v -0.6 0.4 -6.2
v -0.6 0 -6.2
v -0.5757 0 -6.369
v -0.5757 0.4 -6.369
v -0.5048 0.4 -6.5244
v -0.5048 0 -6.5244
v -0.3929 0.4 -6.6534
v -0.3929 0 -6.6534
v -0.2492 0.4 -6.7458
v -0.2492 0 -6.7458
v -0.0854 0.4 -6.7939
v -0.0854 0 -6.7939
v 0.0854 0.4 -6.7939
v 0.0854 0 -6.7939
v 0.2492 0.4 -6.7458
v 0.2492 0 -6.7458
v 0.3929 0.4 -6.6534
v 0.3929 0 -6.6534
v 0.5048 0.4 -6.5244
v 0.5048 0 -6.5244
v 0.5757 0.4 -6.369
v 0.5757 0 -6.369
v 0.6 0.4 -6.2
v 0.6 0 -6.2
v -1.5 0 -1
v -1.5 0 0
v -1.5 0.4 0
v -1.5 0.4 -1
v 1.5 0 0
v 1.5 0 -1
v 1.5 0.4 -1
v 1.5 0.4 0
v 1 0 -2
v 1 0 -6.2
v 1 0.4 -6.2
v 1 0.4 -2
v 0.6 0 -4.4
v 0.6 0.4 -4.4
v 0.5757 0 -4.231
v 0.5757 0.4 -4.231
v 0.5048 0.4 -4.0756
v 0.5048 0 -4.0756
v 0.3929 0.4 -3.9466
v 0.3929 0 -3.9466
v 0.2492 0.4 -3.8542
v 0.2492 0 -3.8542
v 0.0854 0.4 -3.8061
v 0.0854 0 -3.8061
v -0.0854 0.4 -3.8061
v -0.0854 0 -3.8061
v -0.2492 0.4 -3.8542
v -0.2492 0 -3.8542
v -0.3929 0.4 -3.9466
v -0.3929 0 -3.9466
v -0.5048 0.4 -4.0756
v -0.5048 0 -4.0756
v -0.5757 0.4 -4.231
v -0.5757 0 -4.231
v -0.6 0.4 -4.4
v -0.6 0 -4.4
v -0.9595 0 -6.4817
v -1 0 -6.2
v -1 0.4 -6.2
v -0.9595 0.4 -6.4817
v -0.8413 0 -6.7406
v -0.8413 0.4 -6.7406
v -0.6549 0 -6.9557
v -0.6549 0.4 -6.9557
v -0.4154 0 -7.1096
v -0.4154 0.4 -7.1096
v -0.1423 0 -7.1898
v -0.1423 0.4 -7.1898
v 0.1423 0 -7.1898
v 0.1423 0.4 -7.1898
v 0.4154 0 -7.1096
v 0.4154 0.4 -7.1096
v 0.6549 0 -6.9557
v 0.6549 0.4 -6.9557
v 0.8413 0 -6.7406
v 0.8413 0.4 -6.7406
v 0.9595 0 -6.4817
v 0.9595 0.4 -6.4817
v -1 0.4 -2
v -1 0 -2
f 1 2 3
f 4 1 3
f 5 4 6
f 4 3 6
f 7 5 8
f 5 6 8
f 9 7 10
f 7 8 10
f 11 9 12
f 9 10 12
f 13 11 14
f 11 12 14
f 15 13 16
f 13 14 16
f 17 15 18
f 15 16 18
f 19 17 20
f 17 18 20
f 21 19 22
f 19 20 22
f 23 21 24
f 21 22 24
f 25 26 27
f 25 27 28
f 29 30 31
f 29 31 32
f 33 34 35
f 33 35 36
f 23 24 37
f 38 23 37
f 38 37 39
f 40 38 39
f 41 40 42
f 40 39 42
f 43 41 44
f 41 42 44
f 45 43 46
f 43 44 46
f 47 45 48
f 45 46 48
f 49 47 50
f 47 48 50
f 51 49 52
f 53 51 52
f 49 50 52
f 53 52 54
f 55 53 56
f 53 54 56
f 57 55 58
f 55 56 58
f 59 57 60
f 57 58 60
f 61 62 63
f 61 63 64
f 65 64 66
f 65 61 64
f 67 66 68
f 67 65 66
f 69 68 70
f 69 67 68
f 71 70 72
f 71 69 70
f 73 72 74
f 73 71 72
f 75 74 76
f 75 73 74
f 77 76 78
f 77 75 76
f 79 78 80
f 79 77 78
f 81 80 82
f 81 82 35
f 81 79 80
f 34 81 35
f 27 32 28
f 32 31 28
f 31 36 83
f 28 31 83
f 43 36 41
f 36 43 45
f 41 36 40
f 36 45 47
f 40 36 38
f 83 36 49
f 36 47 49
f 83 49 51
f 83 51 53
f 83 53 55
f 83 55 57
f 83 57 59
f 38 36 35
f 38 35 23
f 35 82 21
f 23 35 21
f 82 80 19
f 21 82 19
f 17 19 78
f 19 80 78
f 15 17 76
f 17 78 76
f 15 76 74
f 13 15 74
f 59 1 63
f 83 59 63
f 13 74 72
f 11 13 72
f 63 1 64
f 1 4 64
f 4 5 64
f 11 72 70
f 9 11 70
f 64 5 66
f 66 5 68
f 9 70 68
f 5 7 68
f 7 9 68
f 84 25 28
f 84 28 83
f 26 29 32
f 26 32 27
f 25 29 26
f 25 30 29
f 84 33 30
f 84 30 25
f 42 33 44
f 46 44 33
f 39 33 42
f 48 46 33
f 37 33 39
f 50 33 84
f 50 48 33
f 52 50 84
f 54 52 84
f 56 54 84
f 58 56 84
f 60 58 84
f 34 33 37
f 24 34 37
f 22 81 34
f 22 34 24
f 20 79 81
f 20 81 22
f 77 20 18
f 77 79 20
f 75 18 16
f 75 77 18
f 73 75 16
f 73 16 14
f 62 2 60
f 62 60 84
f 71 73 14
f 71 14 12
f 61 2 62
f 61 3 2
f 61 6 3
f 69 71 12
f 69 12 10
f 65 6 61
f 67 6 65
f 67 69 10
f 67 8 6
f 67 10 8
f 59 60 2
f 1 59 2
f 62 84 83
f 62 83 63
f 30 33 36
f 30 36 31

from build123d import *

# Parameters (mm, degrees)
BOSS_EXTRUDE1_DEPTH = 0.4


with BuildPart() as part:
    # Sketch1 → Boss-Extrude1 (new body)
    with BuildSketch(Plane(origin=(0, 0, 0), x_dir=(1, 0, 0), z_dir=(0, 1, 0))):
        with BuildLine():
            Line((1.5, 0), (-1.5, 0))
            Line((-1.5, 0), (-1.5, 1))
            Line((-1.5, 1), (-1, 2))
            Line((-1, 2), (-1, 6.2))
            ThreePointArc((-1, 6.2), (0, 7.2), (1, 6.2))
            Line((1, 6.2), (1, 2))
            Line((1, 2), (1.5, 1))
            Line((1.5, 1), (1.5, 0))
        make_face()
        with BuildLine():
            Line((-0.6, 4.4), (-0.6, 6.2))
            ThreePointArc((-0.6, 6.2), (0, 6.8), (0.6, 6.2))
            Line((0.6, 6.2), (0.6, 4.4))
            ThreePointArc((0.6, 4.4), (0, 3.8), (-0.6, 4.4))
        make_face(mode=Mode.SUBTRACT)
    extrude(amount=BOSS_EXTRUDE1_DEPTH)


solid = part.part
